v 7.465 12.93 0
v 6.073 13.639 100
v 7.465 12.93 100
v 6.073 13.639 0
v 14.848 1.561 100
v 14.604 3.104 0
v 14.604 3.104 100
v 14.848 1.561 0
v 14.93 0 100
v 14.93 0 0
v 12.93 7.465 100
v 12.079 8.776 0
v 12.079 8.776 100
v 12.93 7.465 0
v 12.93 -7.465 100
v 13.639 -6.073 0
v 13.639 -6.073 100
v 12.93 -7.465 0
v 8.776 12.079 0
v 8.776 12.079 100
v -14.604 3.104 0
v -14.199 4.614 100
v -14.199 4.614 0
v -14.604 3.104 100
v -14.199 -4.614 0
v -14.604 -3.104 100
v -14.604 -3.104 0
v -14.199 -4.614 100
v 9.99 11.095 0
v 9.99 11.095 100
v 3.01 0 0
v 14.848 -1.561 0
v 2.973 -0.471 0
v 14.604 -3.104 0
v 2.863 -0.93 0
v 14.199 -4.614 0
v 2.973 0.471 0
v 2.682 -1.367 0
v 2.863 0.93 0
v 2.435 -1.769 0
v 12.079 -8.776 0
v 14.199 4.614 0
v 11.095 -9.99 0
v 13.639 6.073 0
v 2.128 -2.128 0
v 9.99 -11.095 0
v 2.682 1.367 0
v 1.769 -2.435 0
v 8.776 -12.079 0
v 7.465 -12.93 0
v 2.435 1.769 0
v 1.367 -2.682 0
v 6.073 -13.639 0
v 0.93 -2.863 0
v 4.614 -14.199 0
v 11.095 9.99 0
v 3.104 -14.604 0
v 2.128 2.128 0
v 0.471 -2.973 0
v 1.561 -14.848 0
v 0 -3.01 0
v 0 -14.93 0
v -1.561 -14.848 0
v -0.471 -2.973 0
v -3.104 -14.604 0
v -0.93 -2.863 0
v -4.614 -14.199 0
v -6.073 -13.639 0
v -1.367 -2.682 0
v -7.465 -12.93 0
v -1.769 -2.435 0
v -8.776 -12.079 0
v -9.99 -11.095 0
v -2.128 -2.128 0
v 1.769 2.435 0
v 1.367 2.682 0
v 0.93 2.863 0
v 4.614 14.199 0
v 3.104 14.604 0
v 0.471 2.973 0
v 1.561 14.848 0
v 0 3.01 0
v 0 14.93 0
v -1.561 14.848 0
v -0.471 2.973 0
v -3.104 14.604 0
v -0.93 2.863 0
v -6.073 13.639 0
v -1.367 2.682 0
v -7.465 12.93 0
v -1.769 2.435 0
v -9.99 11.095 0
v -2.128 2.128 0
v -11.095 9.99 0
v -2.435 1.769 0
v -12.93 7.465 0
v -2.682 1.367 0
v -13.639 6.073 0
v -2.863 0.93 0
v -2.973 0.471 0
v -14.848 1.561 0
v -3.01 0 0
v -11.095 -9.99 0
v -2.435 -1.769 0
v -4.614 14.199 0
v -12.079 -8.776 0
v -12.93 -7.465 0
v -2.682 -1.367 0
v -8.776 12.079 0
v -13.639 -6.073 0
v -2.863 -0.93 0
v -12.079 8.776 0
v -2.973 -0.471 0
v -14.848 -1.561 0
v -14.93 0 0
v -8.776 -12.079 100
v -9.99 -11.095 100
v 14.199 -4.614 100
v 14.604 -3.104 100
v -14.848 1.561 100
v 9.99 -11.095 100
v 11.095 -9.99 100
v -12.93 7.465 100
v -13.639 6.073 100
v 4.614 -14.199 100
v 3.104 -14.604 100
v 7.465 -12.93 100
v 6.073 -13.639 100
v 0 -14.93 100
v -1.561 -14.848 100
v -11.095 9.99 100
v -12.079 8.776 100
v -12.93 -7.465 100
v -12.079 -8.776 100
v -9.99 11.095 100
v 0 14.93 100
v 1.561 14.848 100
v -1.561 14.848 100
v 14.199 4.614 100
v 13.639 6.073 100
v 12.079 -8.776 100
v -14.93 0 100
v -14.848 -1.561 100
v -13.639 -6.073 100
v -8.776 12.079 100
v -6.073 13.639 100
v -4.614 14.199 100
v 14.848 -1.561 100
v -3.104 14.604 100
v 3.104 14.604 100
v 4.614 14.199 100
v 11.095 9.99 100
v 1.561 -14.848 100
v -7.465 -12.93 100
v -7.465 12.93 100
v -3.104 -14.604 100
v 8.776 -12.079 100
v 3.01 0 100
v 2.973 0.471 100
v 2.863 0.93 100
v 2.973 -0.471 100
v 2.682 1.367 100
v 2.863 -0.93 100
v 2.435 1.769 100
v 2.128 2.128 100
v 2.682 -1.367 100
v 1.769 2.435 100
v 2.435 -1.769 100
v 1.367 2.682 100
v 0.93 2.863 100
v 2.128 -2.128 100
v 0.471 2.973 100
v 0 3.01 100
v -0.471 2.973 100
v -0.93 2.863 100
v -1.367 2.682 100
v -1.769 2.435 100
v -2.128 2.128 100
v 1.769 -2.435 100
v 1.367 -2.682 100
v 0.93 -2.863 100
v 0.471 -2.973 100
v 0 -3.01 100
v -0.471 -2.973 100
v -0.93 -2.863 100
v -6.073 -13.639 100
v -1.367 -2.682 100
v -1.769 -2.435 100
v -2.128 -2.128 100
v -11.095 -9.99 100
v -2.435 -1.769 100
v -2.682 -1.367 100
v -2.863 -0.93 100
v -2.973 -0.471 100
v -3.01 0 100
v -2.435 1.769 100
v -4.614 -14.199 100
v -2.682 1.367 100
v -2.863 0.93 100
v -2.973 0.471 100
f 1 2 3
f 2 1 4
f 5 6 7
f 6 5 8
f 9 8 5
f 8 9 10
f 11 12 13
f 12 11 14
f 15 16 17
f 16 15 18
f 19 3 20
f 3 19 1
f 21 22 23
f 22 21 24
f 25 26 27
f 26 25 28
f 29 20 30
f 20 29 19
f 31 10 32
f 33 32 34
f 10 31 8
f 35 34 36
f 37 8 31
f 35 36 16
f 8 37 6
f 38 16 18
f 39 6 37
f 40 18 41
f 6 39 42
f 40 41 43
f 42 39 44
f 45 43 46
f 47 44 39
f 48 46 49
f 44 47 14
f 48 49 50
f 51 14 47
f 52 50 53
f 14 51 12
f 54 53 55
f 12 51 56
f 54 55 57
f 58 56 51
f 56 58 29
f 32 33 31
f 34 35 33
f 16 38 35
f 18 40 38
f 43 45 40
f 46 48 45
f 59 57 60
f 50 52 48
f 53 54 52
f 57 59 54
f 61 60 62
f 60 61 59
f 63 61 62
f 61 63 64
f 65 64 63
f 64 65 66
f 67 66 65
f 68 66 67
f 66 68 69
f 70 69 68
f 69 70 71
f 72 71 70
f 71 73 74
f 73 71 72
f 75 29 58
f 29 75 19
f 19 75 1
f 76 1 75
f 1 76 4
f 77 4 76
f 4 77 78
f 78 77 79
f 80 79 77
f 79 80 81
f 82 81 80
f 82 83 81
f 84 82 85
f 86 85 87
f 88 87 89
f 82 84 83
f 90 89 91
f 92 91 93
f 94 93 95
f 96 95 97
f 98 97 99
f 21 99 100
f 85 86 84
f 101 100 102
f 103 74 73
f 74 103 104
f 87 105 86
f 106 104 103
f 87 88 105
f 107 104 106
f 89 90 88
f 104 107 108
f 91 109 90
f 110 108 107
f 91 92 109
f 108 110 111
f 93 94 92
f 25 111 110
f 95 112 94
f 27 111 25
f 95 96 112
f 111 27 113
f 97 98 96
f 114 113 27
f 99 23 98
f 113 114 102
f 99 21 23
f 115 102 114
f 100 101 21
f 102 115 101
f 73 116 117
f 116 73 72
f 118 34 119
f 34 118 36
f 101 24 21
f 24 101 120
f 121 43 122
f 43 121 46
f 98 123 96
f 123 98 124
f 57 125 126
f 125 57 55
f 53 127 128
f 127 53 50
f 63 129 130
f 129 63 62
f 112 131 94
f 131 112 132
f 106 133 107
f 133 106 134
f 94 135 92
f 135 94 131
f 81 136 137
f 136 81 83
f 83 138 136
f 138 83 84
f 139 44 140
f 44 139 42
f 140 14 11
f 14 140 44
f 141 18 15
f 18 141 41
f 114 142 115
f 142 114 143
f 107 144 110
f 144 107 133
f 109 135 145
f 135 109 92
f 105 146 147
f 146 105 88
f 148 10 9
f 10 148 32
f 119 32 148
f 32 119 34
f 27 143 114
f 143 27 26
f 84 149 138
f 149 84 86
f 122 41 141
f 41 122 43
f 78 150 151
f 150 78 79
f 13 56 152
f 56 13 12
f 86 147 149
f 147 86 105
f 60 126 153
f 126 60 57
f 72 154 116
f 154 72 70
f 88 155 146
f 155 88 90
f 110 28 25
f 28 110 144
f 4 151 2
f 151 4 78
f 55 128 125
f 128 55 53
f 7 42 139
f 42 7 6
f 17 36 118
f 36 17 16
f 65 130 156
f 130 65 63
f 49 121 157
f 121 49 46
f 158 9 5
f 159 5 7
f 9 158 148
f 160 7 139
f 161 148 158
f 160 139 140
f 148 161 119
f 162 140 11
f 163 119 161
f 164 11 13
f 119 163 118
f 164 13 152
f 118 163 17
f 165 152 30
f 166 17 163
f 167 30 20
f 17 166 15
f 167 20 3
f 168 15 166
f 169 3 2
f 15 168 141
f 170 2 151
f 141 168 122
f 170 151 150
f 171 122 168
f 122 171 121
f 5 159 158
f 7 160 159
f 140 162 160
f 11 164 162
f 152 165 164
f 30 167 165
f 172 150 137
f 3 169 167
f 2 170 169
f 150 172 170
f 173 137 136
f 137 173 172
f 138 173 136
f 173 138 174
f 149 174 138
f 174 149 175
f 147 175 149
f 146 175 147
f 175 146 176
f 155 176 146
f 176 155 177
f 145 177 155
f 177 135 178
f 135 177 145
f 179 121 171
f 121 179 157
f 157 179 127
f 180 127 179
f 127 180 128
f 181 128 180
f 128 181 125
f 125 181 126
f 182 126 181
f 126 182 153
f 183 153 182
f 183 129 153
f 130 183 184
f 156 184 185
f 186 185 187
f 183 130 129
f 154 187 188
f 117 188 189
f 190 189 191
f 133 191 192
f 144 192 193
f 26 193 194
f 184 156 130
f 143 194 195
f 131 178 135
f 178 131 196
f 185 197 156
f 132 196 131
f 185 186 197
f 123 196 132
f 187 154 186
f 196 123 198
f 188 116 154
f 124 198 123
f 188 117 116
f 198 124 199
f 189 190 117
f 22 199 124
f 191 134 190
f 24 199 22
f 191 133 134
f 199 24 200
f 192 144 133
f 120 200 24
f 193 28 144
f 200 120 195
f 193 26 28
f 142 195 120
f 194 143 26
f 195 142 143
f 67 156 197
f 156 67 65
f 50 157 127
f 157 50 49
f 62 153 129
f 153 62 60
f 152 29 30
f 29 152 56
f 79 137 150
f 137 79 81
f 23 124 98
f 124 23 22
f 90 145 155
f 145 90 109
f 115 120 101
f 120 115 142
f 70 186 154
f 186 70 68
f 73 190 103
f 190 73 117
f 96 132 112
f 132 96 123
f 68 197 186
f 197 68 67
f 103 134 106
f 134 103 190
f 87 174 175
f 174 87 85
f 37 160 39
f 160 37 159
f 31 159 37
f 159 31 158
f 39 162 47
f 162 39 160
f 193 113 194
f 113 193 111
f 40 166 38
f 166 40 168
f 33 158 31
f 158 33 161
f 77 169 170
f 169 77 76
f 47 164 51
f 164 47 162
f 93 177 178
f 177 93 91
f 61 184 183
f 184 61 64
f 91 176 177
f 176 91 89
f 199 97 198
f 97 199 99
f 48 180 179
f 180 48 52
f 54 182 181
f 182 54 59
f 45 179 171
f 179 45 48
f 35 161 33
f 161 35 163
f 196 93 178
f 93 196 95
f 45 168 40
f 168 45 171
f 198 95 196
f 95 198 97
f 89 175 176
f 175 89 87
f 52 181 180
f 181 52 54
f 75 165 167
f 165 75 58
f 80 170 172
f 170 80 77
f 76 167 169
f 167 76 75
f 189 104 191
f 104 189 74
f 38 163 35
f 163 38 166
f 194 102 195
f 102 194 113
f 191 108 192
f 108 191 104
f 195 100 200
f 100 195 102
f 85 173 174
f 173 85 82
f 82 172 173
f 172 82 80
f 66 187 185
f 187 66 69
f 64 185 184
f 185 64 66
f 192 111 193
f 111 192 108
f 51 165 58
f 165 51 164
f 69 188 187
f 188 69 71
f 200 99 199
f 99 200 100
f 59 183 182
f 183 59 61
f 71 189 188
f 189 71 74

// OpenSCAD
        // Generation: 5 | Session: test-env-id
        wall_thickness = 2.58;
        bore_clearance = 1.0100000000000002;
        roller_radius = 14.93;
        
        module roller() {
            difference() {
                cylinder(h=100, r=roller_radius, $fn=60);
                translate([0,0,-5])
                    cylinder(h=110, r=bore_clearance + 2, $fn=40);
            }
        }
        roller();
        
